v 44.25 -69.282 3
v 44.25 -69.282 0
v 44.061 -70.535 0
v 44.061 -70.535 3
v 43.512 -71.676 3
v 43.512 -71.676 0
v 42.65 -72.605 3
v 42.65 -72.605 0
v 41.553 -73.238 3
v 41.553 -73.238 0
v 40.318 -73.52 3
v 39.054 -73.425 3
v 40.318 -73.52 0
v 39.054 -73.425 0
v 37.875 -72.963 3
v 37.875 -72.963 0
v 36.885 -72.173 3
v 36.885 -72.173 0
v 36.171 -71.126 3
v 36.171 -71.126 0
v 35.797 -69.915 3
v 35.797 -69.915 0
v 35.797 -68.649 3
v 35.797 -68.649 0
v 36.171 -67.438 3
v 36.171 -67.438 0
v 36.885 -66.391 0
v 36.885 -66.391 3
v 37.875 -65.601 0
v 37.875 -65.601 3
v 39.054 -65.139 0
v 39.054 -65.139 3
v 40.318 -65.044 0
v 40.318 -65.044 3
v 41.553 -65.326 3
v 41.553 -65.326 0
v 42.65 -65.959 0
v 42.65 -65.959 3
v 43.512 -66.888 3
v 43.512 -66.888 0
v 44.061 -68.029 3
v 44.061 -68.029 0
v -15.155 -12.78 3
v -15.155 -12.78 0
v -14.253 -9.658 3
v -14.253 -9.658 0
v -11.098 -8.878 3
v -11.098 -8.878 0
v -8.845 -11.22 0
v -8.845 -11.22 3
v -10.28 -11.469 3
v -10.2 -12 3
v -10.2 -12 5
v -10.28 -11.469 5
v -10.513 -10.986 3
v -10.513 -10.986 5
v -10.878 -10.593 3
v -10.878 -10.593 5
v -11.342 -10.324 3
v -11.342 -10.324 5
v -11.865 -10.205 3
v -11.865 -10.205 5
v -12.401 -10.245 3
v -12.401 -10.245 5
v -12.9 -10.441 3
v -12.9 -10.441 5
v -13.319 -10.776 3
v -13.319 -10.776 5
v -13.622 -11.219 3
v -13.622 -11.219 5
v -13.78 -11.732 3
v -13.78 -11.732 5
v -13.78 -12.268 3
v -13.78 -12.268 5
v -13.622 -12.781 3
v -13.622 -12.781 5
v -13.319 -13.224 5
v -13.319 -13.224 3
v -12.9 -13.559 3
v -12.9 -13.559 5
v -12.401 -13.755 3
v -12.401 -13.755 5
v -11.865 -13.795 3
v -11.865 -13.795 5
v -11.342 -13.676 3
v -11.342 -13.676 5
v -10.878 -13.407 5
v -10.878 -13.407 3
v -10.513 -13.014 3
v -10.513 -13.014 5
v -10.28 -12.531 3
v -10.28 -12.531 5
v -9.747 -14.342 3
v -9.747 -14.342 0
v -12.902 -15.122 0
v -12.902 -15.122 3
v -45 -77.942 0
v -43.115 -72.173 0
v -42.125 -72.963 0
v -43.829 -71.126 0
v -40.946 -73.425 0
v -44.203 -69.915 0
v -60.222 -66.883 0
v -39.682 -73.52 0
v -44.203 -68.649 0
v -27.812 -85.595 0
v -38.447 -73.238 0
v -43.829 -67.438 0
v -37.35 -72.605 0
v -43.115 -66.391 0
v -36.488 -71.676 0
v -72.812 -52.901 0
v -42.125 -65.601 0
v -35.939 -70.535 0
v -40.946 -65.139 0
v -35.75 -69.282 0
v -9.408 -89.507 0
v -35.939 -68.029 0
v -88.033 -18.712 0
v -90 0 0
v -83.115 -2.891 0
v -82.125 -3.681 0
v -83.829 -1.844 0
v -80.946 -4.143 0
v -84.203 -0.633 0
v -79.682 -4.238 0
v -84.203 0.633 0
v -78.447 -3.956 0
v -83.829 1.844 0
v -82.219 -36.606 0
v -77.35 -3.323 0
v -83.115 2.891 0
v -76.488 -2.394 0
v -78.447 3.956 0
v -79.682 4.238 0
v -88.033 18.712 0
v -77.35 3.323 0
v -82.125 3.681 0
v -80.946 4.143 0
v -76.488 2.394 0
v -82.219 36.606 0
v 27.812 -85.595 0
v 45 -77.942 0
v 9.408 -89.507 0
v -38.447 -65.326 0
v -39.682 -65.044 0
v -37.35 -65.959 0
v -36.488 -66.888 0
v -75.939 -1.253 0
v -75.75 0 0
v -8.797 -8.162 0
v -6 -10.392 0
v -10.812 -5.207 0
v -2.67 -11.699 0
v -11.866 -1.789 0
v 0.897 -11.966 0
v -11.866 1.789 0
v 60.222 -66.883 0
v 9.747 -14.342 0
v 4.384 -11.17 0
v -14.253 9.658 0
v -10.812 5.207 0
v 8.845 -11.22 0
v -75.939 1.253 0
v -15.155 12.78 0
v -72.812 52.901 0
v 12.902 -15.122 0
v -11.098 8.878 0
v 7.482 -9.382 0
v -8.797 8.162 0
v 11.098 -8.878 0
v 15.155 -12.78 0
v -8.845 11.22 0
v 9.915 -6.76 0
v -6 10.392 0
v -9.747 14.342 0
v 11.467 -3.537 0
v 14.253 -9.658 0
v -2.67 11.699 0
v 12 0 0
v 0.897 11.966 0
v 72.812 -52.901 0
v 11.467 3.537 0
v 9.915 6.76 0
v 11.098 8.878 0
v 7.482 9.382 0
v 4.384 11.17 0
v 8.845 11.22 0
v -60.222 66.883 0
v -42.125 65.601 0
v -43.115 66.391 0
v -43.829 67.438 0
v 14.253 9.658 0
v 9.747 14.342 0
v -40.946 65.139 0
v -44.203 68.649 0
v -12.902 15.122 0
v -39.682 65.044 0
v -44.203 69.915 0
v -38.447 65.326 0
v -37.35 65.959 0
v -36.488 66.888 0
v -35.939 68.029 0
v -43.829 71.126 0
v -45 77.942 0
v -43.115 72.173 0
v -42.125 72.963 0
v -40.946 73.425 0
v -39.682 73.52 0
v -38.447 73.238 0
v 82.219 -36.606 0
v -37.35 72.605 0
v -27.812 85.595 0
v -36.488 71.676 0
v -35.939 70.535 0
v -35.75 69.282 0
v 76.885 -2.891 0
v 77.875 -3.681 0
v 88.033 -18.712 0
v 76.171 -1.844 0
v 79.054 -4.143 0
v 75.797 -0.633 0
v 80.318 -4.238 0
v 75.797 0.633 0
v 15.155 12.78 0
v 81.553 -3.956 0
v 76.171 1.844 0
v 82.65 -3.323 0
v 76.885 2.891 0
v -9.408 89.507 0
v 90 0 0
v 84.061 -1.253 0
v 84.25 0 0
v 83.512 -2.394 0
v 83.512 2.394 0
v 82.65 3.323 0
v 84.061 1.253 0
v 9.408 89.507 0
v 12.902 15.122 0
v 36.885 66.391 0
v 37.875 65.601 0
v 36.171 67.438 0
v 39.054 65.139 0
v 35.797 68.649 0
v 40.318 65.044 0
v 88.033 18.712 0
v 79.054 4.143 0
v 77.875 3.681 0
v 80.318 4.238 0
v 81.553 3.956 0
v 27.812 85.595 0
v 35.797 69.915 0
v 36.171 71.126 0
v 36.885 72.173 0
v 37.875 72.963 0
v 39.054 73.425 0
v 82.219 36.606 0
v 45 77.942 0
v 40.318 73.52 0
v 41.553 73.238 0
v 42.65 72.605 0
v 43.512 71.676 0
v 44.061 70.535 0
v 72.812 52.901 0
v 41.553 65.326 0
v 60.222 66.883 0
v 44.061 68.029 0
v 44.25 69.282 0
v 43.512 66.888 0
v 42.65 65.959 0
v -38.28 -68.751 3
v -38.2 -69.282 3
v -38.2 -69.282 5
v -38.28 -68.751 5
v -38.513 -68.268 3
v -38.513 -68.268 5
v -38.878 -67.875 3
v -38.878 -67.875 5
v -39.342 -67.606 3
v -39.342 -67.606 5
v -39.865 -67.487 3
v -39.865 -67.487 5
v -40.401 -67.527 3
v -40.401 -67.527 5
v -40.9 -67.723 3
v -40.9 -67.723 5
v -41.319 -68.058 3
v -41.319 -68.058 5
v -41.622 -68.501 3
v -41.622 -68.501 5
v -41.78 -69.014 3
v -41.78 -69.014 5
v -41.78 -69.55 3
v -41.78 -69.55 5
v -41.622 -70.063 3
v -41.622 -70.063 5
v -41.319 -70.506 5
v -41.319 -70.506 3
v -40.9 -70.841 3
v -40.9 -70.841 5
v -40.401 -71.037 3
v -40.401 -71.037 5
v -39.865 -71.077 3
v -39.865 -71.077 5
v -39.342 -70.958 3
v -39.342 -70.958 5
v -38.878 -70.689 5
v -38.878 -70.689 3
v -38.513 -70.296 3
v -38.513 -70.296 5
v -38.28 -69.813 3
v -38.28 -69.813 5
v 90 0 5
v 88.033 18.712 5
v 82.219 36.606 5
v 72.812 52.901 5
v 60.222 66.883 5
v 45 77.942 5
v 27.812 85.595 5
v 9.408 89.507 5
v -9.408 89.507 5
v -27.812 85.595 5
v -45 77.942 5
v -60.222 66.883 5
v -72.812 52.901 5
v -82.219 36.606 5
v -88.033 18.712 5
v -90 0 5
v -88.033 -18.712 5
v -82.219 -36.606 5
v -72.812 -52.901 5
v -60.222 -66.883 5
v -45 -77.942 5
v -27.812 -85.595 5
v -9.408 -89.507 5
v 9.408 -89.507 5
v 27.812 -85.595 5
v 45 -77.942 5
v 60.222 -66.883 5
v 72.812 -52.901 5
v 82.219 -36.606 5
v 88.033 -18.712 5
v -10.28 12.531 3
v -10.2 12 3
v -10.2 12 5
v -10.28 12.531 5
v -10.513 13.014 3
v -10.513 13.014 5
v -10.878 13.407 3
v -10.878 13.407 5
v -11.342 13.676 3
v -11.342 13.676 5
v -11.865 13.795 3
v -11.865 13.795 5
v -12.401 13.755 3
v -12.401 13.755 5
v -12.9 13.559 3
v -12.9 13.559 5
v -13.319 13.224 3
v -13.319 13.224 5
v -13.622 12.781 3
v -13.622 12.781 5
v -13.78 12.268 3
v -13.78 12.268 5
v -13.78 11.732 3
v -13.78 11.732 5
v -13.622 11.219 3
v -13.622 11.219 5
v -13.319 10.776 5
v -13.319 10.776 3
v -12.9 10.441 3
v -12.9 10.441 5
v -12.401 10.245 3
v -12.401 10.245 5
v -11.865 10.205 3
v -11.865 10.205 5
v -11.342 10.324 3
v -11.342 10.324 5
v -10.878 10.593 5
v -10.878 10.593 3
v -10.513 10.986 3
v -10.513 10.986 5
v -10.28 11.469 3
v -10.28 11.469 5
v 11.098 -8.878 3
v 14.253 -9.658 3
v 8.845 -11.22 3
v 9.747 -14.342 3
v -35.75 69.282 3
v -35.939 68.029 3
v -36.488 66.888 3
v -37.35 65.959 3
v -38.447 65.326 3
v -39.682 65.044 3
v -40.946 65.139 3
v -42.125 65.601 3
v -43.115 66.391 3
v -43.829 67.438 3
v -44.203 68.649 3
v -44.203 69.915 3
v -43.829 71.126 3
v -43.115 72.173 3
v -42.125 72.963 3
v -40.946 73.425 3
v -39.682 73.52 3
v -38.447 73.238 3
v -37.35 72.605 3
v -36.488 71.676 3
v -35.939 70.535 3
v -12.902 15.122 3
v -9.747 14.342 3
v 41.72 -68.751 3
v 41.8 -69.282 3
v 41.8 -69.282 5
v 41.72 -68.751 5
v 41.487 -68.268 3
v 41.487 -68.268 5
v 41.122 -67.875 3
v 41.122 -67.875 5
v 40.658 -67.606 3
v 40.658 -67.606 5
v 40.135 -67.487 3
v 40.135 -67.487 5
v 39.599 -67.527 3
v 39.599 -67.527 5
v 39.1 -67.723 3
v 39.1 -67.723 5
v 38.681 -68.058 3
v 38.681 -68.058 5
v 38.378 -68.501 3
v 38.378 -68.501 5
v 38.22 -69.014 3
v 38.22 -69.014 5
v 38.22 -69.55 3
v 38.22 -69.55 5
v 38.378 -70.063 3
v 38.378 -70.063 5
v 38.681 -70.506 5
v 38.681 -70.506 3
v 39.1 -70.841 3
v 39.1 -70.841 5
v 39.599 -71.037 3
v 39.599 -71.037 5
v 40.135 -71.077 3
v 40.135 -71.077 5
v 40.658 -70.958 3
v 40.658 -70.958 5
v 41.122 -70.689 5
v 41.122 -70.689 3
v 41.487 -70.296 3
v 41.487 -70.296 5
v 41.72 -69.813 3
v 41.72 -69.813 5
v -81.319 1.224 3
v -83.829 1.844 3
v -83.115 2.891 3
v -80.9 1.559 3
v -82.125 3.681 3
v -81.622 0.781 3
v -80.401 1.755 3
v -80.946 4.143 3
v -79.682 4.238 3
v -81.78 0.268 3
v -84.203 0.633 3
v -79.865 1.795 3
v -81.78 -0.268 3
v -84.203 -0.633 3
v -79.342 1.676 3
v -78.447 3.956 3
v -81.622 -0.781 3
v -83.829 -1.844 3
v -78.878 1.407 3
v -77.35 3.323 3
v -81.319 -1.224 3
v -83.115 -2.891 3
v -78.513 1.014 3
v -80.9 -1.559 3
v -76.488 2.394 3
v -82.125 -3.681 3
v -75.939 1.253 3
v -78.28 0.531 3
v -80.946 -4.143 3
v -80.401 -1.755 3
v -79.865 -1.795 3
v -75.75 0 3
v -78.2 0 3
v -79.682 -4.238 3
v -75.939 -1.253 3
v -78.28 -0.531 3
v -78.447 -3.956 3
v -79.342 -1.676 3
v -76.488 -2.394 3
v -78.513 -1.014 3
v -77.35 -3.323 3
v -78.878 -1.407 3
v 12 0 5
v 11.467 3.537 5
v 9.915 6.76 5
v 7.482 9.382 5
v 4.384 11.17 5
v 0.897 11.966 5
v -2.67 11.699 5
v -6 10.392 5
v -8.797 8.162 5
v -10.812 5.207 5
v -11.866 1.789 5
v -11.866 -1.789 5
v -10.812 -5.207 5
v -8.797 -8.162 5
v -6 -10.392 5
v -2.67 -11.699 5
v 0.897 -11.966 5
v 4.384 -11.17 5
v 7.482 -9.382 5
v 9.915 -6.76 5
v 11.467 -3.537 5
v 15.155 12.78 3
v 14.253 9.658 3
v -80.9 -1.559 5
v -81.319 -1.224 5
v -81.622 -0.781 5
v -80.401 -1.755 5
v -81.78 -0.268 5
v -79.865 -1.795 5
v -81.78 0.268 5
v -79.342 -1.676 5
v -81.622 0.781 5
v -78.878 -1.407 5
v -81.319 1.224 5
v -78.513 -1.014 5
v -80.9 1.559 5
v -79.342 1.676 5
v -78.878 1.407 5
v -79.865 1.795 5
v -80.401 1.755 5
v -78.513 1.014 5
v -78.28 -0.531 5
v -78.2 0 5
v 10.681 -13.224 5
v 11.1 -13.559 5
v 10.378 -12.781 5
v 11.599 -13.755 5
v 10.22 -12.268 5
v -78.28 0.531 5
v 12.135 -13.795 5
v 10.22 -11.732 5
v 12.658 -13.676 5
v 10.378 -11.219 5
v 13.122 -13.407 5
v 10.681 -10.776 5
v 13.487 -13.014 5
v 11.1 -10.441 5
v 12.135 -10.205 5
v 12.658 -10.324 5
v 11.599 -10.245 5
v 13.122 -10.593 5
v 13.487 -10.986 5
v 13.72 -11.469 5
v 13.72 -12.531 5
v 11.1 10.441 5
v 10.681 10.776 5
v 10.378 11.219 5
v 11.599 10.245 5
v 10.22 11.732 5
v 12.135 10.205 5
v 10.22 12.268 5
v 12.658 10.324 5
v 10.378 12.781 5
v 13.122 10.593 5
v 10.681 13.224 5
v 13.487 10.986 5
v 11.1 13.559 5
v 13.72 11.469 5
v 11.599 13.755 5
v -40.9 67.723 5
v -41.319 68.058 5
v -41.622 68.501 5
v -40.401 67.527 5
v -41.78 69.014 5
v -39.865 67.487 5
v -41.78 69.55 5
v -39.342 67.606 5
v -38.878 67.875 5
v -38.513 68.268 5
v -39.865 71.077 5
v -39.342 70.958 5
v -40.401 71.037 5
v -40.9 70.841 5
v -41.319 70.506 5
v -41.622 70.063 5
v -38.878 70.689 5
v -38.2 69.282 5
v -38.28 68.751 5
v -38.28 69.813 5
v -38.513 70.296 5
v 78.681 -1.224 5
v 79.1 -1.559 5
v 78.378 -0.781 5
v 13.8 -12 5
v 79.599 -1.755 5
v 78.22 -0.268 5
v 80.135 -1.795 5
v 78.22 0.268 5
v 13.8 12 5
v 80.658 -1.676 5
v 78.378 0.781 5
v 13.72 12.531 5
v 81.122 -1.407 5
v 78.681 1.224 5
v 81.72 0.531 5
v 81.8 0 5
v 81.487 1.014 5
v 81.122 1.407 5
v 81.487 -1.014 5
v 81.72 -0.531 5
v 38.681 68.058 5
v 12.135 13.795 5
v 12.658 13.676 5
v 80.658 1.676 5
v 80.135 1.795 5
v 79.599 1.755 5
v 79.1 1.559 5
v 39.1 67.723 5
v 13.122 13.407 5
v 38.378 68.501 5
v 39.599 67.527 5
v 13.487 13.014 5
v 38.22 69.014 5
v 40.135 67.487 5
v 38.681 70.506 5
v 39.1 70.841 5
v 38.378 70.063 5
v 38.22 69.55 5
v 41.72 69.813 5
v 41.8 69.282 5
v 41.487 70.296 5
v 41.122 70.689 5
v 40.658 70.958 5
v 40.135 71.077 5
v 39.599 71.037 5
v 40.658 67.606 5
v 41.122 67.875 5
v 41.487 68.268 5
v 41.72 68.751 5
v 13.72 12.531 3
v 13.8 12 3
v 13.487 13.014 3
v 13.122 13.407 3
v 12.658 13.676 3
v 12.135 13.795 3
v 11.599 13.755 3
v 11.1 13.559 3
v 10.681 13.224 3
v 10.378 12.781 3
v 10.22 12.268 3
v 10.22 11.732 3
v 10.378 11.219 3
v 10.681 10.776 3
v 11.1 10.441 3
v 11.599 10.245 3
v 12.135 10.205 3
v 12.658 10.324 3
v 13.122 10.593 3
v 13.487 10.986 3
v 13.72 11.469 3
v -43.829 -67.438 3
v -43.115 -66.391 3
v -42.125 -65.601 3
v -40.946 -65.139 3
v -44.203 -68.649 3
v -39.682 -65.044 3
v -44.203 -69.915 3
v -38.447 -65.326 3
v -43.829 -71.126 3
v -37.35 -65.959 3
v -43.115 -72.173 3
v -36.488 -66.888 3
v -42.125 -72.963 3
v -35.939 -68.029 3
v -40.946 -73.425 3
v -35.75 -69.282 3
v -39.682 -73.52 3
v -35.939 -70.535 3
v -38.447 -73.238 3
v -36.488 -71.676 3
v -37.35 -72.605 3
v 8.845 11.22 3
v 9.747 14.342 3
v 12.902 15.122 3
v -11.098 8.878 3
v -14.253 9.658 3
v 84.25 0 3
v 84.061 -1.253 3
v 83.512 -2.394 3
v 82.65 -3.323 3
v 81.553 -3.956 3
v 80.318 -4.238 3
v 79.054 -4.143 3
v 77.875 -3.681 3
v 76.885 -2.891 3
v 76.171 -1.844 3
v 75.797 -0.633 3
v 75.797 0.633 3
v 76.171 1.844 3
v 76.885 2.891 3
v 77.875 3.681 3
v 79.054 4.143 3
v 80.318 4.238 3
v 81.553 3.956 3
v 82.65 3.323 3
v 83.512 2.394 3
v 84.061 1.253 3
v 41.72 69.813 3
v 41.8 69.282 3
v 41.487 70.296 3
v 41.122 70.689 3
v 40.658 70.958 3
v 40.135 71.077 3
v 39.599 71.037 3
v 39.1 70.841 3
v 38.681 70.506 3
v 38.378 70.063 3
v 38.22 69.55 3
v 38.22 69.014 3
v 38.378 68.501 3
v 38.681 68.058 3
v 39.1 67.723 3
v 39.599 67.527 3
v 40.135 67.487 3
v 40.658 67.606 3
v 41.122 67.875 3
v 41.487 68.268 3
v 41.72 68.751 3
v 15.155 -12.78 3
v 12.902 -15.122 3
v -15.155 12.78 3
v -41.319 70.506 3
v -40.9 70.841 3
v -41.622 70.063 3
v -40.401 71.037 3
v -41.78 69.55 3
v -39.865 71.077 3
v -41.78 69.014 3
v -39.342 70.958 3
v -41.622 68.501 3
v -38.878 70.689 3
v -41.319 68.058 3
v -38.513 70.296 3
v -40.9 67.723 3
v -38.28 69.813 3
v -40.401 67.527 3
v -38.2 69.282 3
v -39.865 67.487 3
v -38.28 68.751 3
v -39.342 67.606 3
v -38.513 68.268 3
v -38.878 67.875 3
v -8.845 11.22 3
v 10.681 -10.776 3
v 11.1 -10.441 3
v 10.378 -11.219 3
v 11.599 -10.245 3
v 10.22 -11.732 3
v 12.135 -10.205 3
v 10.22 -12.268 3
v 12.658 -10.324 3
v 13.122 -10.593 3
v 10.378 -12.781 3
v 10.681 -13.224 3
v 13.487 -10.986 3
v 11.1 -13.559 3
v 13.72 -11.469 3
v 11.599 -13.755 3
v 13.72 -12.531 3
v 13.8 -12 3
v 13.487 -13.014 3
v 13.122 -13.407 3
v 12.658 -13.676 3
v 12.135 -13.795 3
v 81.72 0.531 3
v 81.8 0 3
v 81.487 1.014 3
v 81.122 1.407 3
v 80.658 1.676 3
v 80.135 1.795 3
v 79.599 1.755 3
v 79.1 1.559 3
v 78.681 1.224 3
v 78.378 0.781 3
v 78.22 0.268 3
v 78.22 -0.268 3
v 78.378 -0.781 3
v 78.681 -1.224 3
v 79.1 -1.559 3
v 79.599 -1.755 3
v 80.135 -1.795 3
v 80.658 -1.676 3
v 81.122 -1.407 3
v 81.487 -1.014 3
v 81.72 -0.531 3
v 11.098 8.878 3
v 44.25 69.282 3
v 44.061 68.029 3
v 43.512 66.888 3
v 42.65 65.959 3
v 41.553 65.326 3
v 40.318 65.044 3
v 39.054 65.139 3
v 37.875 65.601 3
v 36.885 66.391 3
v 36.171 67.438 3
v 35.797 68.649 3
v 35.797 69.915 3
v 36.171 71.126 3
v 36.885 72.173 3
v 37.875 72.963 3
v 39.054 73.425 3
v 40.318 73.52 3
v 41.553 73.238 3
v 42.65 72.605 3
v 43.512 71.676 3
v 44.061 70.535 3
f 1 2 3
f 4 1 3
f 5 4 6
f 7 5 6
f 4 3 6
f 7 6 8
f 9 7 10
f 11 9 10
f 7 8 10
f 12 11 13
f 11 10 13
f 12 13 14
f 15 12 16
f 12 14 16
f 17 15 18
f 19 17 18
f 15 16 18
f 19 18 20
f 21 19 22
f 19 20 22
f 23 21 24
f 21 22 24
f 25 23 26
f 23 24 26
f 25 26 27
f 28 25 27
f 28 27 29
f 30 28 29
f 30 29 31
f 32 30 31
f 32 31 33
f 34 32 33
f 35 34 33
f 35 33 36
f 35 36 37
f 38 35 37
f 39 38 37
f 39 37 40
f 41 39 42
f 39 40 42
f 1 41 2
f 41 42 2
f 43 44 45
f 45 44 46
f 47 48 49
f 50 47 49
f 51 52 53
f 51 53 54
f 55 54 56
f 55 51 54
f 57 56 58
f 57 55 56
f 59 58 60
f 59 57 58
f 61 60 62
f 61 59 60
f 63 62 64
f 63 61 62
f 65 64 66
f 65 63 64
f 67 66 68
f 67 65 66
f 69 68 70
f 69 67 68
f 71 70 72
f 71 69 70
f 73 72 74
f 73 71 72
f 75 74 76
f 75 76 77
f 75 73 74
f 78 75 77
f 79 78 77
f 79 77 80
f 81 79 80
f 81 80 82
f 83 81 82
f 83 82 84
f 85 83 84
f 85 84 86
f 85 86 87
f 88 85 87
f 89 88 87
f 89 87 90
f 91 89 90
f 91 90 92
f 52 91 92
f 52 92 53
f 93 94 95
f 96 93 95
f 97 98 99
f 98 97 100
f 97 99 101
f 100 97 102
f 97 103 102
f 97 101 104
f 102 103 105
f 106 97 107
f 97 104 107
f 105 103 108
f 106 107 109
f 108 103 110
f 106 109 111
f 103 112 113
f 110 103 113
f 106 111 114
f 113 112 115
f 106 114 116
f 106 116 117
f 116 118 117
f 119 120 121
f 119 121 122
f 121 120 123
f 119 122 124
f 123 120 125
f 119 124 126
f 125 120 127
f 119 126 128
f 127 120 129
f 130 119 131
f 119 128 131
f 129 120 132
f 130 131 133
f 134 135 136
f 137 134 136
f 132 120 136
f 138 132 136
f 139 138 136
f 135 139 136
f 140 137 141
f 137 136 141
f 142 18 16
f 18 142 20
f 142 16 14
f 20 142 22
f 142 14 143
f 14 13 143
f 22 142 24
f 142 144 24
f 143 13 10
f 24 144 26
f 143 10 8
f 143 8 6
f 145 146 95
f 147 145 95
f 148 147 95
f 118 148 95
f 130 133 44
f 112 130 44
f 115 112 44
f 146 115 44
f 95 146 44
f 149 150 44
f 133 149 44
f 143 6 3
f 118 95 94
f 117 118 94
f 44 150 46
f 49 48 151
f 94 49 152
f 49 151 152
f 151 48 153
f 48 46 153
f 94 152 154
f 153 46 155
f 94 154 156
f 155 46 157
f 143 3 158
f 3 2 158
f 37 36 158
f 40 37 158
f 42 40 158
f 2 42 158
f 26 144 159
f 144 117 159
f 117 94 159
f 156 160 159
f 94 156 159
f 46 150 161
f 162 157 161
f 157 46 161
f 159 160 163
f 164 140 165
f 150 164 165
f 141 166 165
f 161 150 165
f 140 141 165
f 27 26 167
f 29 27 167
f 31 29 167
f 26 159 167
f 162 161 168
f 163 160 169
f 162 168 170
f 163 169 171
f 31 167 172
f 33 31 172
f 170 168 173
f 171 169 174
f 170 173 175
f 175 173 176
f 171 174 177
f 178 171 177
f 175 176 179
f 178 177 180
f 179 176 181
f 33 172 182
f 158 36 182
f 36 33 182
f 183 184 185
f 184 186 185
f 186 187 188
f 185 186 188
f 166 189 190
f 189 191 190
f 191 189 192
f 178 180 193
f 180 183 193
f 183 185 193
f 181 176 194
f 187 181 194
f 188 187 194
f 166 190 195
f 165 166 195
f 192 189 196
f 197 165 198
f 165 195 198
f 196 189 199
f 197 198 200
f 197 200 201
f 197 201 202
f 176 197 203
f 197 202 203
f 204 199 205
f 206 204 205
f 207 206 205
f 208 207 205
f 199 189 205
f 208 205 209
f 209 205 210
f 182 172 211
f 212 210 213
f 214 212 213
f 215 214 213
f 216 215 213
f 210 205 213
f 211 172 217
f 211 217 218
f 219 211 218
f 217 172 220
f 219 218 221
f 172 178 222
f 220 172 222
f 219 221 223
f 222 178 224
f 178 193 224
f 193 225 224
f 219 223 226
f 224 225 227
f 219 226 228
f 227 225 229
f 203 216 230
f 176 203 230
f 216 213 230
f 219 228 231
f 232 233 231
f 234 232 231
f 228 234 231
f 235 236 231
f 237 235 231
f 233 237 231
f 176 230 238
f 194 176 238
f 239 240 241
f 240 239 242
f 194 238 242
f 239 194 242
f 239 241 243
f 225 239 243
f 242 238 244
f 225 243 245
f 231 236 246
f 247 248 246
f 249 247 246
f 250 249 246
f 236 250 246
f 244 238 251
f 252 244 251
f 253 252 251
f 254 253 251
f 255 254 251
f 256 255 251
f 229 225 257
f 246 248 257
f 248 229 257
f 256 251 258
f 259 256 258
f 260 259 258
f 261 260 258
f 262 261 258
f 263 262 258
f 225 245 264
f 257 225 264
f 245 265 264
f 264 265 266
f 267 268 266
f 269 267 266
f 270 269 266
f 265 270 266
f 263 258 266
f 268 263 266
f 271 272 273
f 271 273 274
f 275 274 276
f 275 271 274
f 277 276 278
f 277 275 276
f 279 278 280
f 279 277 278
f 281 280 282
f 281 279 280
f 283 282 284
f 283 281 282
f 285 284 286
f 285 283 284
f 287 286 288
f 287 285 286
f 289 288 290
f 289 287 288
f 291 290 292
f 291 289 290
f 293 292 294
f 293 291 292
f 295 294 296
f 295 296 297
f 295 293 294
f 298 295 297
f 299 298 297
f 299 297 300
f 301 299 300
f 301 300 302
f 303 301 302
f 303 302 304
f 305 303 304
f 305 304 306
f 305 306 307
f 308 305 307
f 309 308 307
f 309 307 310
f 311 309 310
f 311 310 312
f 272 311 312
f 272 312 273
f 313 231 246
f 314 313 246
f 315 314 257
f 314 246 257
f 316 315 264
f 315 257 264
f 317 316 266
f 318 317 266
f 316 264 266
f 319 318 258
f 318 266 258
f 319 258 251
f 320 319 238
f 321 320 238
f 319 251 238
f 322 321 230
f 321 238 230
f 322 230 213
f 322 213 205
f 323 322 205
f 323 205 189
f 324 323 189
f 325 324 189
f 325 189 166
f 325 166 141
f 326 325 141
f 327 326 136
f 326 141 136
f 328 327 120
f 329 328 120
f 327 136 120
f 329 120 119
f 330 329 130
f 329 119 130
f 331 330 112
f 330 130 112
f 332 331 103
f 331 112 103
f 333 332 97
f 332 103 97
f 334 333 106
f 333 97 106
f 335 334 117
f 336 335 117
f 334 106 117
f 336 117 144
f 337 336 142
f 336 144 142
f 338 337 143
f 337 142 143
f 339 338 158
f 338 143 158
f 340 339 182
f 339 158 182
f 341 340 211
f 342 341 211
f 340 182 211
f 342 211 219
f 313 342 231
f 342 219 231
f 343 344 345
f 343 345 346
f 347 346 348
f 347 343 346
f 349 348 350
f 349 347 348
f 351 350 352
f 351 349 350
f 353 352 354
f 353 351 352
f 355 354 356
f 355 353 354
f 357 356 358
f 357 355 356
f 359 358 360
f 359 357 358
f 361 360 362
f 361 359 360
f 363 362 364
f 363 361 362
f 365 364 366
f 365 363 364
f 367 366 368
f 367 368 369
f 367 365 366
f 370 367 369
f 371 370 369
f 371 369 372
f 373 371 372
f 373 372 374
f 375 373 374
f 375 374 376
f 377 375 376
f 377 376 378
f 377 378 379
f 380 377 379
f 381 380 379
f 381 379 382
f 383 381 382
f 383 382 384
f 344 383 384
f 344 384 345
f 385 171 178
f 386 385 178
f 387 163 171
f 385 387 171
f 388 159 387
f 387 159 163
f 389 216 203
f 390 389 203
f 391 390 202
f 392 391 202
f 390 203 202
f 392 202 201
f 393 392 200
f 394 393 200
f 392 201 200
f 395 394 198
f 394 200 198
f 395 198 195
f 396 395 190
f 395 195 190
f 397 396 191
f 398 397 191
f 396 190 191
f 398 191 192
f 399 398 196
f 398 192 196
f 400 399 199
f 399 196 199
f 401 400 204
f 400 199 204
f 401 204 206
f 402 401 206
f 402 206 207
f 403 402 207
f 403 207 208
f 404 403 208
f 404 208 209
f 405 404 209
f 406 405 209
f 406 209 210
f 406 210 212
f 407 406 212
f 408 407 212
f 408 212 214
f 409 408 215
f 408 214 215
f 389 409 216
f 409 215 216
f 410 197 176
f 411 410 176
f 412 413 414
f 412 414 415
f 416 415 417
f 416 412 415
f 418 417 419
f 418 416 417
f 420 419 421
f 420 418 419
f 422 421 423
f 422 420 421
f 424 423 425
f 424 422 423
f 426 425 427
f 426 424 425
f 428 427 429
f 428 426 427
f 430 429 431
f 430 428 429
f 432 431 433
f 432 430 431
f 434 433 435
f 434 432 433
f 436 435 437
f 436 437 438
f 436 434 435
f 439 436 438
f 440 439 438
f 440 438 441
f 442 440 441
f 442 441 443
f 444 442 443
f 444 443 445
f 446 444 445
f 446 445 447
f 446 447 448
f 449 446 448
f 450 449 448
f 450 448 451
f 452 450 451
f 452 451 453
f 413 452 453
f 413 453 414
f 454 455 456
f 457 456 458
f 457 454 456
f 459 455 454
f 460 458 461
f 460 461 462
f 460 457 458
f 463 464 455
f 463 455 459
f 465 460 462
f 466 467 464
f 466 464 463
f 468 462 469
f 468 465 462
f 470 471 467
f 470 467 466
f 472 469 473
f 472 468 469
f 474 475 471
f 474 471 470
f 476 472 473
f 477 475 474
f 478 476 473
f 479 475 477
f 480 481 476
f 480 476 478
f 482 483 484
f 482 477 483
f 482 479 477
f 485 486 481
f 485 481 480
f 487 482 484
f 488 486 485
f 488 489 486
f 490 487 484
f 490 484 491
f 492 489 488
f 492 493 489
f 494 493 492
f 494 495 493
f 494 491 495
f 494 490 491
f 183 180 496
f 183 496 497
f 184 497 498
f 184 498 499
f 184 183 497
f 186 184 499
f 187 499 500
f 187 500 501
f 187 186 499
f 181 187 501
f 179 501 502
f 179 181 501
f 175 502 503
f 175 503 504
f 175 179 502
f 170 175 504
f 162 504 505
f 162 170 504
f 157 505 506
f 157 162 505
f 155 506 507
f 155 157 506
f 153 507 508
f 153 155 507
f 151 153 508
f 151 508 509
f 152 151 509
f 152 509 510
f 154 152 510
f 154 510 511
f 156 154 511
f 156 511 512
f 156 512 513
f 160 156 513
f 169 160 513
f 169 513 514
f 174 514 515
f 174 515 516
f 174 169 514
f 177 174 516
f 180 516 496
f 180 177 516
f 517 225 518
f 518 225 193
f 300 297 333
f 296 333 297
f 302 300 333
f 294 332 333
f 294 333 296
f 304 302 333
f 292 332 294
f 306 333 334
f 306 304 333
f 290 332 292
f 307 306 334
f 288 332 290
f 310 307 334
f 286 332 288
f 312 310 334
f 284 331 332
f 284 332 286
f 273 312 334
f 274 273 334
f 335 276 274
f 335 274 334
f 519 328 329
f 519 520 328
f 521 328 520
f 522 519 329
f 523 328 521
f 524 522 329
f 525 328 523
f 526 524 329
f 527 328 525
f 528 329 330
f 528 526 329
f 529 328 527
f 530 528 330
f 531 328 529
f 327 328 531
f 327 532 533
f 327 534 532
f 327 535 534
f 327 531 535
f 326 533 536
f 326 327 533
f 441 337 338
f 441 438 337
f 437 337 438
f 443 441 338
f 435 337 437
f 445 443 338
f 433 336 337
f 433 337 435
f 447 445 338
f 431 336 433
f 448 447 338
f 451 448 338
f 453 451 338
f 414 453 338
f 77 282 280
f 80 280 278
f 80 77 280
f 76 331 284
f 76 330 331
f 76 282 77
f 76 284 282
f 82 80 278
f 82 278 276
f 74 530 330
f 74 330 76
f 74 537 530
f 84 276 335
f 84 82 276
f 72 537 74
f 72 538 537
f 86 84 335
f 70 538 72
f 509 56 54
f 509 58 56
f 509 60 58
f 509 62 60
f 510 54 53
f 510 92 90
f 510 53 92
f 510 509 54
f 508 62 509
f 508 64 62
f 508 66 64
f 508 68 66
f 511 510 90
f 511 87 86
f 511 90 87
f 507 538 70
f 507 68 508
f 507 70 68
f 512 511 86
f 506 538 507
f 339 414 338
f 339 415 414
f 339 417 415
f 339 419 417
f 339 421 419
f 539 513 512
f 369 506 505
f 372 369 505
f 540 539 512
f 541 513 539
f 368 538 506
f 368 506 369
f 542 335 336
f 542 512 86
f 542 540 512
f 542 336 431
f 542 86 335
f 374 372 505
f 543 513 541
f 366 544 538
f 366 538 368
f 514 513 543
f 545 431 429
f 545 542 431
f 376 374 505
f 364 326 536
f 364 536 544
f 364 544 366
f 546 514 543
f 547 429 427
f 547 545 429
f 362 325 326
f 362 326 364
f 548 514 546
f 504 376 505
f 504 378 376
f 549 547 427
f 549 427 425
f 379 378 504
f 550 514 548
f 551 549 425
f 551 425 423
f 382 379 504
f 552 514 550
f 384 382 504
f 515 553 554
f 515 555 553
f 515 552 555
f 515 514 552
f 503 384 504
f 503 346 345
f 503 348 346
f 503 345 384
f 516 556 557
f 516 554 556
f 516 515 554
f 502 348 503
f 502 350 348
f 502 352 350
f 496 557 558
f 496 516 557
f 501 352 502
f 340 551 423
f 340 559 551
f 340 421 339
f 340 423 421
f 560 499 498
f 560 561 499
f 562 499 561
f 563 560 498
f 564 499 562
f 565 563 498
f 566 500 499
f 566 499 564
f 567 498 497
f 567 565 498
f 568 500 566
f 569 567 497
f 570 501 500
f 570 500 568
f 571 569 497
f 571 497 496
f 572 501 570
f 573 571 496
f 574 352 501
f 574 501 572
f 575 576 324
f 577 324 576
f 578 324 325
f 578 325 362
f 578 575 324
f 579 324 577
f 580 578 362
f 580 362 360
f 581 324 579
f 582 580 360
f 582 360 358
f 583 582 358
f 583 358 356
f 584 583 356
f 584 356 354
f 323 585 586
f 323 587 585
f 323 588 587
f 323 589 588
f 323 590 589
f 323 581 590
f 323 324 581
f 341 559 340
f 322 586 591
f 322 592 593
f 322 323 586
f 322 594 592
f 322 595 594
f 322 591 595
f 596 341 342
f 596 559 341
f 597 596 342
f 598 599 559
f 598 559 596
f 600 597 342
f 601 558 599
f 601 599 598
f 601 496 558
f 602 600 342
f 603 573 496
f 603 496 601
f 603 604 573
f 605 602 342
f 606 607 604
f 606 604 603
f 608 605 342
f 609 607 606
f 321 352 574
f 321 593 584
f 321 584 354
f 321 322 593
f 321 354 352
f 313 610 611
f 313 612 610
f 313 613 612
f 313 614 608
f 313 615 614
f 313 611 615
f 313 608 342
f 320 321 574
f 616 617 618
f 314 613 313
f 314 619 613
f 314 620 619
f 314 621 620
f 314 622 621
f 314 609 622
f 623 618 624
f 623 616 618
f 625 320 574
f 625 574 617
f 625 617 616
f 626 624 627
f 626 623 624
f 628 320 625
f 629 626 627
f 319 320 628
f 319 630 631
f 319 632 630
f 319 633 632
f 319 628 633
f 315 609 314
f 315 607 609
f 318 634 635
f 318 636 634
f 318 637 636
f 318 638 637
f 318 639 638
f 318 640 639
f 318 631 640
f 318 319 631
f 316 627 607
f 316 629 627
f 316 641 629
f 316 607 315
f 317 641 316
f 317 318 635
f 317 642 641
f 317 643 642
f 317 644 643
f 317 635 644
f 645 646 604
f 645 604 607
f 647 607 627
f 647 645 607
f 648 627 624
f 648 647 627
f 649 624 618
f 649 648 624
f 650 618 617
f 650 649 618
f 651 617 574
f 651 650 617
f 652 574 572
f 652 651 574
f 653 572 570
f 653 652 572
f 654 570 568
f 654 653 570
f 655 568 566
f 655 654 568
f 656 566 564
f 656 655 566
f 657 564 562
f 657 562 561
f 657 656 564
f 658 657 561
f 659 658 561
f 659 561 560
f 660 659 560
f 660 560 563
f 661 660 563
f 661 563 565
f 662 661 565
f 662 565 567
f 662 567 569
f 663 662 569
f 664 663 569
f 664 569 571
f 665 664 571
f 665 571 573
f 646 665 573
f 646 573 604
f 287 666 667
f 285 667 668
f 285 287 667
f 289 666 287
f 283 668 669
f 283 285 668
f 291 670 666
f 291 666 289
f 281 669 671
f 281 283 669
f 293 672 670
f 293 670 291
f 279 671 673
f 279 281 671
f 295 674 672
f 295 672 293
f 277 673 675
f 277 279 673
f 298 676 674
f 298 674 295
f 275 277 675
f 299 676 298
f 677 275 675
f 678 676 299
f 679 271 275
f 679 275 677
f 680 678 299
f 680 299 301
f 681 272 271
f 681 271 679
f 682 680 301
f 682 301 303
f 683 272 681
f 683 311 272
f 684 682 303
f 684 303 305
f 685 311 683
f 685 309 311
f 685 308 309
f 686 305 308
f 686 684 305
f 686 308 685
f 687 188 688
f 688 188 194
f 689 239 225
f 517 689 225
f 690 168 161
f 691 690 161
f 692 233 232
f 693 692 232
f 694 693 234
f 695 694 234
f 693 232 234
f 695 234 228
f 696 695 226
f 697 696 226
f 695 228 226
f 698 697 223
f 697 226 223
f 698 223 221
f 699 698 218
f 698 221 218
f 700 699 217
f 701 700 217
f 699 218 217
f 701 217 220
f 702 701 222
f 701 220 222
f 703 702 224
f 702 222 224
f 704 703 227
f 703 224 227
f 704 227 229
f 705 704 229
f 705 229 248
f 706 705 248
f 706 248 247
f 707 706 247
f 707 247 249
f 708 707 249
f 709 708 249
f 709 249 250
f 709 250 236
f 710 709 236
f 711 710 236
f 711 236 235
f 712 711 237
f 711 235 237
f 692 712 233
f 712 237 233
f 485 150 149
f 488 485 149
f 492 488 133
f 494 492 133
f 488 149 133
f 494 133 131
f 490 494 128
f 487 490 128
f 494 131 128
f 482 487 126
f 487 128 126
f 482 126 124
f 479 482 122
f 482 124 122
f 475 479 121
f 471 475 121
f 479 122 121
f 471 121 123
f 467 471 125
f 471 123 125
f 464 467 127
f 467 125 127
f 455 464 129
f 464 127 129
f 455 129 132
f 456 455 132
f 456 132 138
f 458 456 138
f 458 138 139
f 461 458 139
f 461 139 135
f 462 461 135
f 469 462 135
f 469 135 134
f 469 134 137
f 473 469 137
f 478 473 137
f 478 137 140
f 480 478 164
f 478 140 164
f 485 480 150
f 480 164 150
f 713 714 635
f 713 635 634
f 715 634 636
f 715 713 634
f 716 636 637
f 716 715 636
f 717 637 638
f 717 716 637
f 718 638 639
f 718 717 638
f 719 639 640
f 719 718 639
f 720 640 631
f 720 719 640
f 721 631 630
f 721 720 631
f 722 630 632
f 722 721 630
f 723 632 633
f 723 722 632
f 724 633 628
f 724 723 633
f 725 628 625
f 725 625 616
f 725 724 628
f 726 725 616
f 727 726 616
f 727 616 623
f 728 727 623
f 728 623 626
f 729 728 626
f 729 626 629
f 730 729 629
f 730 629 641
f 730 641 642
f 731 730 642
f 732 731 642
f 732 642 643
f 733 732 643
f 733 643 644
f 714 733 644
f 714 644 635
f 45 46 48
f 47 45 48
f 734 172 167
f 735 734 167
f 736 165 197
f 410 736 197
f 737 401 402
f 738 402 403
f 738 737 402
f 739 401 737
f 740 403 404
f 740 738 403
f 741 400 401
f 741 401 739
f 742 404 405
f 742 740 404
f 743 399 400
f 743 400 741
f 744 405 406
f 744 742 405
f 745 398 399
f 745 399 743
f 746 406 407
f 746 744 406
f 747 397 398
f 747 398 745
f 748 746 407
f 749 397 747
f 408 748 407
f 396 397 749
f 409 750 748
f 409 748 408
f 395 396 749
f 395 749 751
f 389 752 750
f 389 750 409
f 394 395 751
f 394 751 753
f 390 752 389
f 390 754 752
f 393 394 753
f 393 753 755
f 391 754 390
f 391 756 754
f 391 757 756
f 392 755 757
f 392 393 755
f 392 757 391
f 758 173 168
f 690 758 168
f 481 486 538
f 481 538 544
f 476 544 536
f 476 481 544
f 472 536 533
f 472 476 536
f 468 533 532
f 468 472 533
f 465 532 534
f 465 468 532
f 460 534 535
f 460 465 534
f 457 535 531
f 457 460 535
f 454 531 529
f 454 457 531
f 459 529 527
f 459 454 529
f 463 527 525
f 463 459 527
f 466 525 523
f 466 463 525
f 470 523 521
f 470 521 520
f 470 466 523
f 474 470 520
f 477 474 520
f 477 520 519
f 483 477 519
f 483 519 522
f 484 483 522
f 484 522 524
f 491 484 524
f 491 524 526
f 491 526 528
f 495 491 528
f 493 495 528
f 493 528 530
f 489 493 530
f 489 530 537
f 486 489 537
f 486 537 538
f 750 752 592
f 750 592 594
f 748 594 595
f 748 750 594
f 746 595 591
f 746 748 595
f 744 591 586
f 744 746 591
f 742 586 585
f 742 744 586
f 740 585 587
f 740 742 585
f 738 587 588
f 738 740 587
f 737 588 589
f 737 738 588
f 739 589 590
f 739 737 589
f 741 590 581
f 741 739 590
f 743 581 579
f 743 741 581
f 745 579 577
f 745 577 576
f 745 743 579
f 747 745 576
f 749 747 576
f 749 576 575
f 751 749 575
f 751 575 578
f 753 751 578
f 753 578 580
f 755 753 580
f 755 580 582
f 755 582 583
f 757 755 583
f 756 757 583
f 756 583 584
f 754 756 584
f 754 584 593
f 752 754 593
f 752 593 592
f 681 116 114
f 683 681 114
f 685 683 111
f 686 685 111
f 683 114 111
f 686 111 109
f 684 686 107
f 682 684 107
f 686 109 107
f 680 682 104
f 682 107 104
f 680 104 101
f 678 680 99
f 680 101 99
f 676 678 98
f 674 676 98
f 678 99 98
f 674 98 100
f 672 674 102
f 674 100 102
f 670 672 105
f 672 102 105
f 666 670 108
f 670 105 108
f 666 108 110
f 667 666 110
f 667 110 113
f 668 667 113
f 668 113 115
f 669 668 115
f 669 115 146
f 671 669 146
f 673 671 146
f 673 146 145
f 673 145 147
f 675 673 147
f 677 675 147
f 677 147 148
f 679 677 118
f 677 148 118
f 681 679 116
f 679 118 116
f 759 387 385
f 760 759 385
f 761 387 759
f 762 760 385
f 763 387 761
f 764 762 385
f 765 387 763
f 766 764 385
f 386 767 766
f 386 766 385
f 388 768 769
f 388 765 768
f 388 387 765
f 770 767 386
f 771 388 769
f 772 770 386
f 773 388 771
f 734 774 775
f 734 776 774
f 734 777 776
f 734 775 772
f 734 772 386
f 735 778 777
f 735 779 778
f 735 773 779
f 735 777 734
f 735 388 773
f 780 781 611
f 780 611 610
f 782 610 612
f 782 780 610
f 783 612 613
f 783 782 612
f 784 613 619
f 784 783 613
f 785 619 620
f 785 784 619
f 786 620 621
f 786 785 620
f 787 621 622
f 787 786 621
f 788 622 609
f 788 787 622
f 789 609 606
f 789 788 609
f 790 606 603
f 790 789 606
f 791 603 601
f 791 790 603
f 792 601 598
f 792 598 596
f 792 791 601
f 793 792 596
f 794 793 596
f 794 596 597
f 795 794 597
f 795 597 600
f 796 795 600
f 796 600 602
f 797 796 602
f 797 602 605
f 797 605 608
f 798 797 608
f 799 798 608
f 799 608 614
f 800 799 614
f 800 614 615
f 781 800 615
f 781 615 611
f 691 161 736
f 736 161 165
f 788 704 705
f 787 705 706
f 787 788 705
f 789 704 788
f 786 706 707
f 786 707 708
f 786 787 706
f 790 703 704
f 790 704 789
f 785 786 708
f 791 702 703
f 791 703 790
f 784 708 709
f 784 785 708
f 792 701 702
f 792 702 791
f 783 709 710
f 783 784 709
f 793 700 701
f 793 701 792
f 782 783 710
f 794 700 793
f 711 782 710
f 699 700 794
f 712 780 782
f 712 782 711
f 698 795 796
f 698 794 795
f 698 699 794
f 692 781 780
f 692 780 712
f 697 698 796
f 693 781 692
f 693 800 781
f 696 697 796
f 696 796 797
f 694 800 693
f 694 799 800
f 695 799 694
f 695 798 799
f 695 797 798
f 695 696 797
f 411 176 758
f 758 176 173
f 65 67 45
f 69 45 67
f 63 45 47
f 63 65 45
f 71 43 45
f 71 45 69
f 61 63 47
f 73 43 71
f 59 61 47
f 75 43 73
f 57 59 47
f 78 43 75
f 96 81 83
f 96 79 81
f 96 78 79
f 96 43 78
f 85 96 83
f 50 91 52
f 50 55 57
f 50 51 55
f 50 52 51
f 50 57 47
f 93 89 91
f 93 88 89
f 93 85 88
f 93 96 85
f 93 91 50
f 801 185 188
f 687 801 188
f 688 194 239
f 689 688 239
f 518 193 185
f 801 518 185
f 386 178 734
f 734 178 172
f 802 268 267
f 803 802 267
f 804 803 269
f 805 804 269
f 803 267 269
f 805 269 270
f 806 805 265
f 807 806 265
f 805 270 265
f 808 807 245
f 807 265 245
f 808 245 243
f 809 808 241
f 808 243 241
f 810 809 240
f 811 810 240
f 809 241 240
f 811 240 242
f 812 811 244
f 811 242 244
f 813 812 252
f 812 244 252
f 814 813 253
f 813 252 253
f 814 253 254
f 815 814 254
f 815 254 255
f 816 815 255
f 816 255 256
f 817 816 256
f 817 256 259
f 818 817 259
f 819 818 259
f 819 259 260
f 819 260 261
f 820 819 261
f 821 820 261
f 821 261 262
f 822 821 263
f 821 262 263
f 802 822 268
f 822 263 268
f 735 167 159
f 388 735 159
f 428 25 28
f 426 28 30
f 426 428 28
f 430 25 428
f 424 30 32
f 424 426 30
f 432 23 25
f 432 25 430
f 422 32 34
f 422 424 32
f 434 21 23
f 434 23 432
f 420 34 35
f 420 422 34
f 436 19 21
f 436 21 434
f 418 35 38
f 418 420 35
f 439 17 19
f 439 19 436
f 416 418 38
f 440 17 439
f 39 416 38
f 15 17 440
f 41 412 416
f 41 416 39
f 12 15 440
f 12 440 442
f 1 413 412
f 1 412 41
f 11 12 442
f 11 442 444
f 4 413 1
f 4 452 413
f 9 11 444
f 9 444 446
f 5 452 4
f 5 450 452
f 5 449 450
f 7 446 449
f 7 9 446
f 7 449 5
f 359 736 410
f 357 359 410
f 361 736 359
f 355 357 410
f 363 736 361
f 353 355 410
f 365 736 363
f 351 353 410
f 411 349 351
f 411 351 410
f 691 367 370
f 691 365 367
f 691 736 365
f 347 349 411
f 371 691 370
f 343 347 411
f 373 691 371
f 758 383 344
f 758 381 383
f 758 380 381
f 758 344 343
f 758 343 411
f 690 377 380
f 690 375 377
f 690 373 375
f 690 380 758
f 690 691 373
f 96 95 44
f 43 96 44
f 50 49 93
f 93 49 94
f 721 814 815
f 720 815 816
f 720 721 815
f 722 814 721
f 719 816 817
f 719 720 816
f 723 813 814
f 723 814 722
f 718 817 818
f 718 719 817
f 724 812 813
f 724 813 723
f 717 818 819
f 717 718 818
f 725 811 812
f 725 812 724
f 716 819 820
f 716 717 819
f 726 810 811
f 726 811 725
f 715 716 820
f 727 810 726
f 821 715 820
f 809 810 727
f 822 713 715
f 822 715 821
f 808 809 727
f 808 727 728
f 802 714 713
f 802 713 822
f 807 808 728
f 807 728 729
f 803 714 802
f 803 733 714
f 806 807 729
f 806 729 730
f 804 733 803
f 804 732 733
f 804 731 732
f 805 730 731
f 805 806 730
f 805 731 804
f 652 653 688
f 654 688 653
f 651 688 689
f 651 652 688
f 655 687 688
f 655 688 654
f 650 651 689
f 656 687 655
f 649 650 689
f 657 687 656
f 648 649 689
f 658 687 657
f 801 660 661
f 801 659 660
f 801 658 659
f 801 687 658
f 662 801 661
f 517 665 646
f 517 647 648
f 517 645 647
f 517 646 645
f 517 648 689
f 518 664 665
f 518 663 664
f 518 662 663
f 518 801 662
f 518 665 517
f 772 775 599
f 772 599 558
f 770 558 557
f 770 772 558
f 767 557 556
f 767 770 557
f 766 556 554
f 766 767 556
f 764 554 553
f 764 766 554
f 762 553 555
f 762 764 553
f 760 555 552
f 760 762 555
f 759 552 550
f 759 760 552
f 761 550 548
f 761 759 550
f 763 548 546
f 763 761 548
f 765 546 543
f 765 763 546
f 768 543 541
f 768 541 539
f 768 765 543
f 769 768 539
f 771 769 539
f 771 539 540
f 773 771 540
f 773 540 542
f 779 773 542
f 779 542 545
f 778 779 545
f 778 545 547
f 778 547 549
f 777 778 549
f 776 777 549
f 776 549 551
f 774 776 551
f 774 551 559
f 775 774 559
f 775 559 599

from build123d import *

# Parameters (mm, degrees)
SKETCH_R        = 90
SKETCH_R_2      = 1.8
SKETCH_R_3      = 12
PAD_DEPTH       = 5
SKETCH001_R     = 4.25
POCKET_DEPTH    = 3
POCKET001_DEPTH = 3


with BuildPart() as part:
    # Sketch → Pad (new body)
    with BuildSketch(Plane.XY):
        Circle(SKETCH_R)
        with Locations((-40, 69.282032)):
            Circle(SKETCH_R_2, mode=Mode.SUBTRACT)
        with Locations((40, 69.282032)):
            Circle(SKETCH_R_2, mode=Mode.SUBTRACT)
        with Locations((80, 0)):
            Circle(SKETCH_R_2, mode=Mode.SUBTRACT)
        with Locations((40, -69.282032)):
            Circle(SKETCH_R_2, mode=Mode.SUBTRACT)
        with Locations((-40, -69.282032)):
            Circle(SKETCH_R_2, mode=Mode.SUBTRACT)
        with Locations((-80, 0)):
            Circle(SKETCH_R_2, mode=Mode.SUBTRACT)
        Circle(SKETCH_R_3, mode=Mode.SUBTRACT)
        with Locations((-12, 12)):
            Circle(SKETCH_R_2, mode=Mode.SUBTRACT)
        with Locations((12, 12)):
            Circle(SKETCH_R_2, mode=Mode.SUBTRACT)
        with Locations((12, -12)):
            Circle(SKETCH_R_2, mode=Mode.SUBTRACT)
        with Locations((-12, -12)):
            Circle(SKETCH_R_2, mode=Mode.SUBTRACT)
    extrude(amount=PAD_DEPTH)

    # Sketch001 → Pocket (cut)
    with BuildSketch(Plane(origin=(0, 0, 0), x_dir=(1, 0, 0), z_dir=(0, 0, -1))):
        with Locations((-40, 69.282032)):
            Circle(SKETCH001_R)
        with Locations((40, 69.282032)):
            Circle(SKETCH001_R)
        with Locations((80, 0)):
            Circle(SKETCH001_R)
        with Locations((40, -69.282032)):
            Circle(SKETCH001_R)
        with Locations((-40, -69.282032)):
            Circle(SKETCH001_R)
        with Locations((-80, 0)):
            Circle(SKETCH001_R)
    extrude(amount=-POCKET_DEPTH, mode=Mode.SUBTRACT)

    # Sketch002 → Pocket001 (cut)
    with BuildSketch(Plane(origin=(0, 0, 0), x_dir=(1, 0, 0), z_dir=(0, 0, -1))):
        Polygon((-8.845014, 11.219894), (-9.746916, 14.342245), (-12.901902, 15.122351), (-15.154986, 12.780106), (-14.253084, 9.657755), (-11.098098, 8.877649), align=None)
        Polygon((14.253084, 9.657755), (15.154986, 12.780106), (12.901902, 15.122351), (9.746916, 14.342245), (8.845014, 11.219894), (11.098098, 8.877649), align=None)
        Polygon((12.901902, -15.122351), (15.154986, -12.780106), (14.253084, -9.657755), (11.098098, -8.877649), (8.845014, -11.219894), (9.746916, -14.342245), align=None)
        Polygon((-9.746916, -14.342245), (-8.845014, -11.219894), (-11.098098, -8.877649), (-14.253084, -9.657755), (-15.154986, -12.780106), (-12.901902, -15.122351), align=None)
    extrude(amount=-POCKET001_DEPTH, mode=Mode.SUBTRACT)


solid = part.part
